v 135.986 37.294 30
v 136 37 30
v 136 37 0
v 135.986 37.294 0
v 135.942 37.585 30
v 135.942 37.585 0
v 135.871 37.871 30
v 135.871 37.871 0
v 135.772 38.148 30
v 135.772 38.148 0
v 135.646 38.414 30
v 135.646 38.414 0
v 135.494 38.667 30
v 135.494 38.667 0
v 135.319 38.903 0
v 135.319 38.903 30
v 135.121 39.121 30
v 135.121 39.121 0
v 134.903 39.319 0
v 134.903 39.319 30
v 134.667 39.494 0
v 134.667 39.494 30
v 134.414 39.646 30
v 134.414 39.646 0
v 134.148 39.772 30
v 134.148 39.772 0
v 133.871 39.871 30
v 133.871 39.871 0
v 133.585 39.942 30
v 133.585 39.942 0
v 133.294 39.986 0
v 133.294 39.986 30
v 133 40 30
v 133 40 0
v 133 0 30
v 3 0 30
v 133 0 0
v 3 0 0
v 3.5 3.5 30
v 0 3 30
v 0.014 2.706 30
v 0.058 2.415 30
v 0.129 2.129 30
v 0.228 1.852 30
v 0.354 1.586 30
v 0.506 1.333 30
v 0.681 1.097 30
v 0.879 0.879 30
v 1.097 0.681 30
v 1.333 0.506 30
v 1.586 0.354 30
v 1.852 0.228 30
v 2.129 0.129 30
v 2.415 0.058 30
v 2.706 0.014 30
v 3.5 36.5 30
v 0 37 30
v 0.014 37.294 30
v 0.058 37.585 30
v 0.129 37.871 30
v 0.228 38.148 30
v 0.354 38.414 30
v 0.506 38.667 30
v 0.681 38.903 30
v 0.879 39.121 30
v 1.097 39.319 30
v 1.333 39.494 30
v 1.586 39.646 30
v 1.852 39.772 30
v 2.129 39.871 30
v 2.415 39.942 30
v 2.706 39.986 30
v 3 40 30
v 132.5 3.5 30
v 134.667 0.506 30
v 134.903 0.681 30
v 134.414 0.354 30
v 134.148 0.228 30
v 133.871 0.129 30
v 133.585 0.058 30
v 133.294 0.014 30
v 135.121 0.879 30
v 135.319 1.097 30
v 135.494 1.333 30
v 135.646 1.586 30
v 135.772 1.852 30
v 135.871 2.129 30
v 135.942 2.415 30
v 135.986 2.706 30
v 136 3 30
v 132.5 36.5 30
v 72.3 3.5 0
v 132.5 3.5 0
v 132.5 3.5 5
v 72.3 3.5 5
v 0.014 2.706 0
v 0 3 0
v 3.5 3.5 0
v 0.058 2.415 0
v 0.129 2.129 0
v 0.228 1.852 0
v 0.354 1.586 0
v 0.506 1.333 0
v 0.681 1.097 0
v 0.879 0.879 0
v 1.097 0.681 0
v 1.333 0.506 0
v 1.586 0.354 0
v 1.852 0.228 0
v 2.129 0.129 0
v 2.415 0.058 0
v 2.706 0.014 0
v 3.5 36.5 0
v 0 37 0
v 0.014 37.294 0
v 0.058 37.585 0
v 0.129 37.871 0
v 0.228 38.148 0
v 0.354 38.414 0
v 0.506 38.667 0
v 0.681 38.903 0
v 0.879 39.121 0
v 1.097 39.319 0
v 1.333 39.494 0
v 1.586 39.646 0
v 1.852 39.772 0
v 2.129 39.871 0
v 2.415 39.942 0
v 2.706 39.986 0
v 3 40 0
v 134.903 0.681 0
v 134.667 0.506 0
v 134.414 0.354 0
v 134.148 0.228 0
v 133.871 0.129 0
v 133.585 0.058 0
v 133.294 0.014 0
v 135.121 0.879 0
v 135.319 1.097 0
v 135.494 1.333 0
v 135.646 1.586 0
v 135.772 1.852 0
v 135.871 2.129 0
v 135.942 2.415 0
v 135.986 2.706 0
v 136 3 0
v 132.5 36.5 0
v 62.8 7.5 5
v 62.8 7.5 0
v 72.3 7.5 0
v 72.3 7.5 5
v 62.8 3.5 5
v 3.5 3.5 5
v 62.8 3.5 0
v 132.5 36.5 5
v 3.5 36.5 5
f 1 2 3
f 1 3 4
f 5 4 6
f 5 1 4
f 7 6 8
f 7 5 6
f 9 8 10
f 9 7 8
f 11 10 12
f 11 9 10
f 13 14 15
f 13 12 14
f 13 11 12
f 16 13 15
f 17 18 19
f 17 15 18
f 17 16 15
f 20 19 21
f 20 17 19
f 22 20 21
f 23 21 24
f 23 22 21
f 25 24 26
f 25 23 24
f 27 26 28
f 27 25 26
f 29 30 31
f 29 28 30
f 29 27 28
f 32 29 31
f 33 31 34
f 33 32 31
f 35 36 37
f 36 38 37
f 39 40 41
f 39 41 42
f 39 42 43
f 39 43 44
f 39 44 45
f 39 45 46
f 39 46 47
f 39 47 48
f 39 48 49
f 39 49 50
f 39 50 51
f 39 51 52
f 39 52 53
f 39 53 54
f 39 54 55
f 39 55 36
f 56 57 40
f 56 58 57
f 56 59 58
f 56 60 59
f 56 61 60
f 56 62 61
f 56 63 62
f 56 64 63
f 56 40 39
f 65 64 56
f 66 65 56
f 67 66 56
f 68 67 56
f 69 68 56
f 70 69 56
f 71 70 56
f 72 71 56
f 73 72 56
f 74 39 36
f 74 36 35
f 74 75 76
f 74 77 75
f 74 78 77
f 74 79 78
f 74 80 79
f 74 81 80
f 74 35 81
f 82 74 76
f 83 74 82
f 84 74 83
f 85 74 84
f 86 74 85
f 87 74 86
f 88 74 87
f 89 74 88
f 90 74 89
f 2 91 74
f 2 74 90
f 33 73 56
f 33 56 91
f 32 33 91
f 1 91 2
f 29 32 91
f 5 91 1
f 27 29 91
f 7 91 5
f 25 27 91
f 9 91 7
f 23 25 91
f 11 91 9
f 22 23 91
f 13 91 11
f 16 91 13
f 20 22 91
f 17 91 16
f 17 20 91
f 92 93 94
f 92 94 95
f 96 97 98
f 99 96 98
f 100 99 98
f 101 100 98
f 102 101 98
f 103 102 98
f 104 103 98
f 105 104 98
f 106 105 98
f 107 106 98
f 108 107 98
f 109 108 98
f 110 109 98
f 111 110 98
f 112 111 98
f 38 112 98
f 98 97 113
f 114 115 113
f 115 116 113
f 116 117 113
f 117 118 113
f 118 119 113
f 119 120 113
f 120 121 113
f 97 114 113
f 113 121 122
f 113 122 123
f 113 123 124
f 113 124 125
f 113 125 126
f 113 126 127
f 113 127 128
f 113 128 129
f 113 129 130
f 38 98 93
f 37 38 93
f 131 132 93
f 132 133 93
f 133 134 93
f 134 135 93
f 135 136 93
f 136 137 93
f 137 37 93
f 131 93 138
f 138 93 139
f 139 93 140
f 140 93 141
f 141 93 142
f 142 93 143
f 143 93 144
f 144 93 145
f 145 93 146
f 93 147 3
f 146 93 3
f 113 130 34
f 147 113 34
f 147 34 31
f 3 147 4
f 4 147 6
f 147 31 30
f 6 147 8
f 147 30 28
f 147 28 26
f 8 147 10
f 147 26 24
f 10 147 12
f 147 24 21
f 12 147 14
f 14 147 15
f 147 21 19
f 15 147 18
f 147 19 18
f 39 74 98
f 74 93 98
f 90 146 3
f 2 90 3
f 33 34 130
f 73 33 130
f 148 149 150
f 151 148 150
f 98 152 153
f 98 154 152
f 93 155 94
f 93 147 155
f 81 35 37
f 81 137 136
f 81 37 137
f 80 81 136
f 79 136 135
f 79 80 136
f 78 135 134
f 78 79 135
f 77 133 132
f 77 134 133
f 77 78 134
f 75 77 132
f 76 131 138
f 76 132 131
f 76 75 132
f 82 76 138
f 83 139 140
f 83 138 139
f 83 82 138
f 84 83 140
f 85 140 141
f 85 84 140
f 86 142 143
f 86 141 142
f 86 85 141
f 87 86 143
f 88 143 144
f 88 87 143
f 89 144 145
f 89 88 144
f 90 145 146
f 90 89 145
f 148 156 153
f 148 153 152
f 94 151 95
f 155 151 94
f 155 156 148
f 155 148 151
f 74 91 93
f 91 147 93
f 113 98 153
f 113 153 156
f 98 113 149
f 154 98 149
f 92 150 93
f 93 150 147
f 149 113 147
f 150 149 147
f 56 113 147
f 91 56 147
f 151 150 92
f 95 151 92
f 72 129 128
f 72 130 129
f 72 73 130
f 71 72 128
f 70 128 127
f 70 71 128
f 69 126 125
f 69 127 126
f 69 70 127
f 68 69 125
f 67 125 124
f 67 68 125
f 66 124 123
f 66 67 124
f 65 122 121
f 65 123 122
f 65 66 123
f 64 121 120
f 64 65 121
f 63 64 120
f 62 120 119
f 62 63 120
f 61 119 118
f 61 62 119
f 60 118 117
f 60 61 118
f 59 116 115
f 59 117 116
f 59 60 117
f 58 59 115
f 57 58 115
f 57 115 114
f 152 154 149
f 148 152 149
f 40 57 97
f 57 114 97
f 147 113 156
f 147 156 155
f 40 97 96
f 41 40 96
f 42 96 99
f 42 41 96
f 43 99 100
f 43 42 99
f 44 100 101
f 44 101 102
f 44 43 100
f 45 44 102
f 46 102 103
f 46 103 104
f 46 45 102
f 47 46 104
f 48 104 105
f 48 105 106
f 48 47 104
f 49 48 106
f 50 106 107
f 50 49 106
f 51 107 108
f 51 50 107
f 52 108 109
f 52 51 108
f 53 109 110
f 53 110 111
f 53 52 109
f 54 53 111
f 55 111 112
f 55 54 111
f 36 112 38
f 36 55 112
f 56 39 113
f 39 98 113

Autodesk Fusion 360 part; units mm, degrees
sketch "Sketch1" plane through (0, 0, 0) normal (0, 0, 1) x (1, 0, 0)
  line L0 (0, 0) -> (136, 0)
  line L1 (136, 0) -> (136, 40)
  line L2 (136, 40) -> (0, 40)
  line L3 (0, 40) -> (0, 0)
  line L4 (3.5, 36.5) -> (132.5, 36.5)
  line L5 (132.5, 36.5) -> (132.5, 3.5)
  line L6 (132.5, 3.5) -> (3.5, 3.5)
  line L7 (3.5, 3.5) -> (3.5, 36.5)
  line L8 (62.8, 7.5) -> (72.3, 7.5)
  line L9 (72.3, 7.5) -> (72.3, 3.5)
  line L10 (72.3, 3.5) -> (62.8, 3.5)
  line L11 (62.8, 3.5) -> (62.8, 7.5)
  dimension "d1" = 40
  dimension "d2" = 136
  dimension "d3" = 129
  dimension "d4" = 33
  dimension "d5" = 3.5
  dimension "d6" = 3.5
  dimension "d7" = 4
  dimension "d8" = 9.5
  dimension "d9" = 59.3
extrude "Extrude1" add sketch "Sketch1" along normal blind 5 contours L4 L5 L6 L7 L8 L9 L11 makes body 1
extrude "Extrude2" add sketch "Sketch1" along normal blind 30 separate body makes body 2
fillet "Fillet1" radius 3 4 edges at (0, 0, 15) (136, 0, 15) (136, 40, 15) (0, 40, 15) on bodies 2
